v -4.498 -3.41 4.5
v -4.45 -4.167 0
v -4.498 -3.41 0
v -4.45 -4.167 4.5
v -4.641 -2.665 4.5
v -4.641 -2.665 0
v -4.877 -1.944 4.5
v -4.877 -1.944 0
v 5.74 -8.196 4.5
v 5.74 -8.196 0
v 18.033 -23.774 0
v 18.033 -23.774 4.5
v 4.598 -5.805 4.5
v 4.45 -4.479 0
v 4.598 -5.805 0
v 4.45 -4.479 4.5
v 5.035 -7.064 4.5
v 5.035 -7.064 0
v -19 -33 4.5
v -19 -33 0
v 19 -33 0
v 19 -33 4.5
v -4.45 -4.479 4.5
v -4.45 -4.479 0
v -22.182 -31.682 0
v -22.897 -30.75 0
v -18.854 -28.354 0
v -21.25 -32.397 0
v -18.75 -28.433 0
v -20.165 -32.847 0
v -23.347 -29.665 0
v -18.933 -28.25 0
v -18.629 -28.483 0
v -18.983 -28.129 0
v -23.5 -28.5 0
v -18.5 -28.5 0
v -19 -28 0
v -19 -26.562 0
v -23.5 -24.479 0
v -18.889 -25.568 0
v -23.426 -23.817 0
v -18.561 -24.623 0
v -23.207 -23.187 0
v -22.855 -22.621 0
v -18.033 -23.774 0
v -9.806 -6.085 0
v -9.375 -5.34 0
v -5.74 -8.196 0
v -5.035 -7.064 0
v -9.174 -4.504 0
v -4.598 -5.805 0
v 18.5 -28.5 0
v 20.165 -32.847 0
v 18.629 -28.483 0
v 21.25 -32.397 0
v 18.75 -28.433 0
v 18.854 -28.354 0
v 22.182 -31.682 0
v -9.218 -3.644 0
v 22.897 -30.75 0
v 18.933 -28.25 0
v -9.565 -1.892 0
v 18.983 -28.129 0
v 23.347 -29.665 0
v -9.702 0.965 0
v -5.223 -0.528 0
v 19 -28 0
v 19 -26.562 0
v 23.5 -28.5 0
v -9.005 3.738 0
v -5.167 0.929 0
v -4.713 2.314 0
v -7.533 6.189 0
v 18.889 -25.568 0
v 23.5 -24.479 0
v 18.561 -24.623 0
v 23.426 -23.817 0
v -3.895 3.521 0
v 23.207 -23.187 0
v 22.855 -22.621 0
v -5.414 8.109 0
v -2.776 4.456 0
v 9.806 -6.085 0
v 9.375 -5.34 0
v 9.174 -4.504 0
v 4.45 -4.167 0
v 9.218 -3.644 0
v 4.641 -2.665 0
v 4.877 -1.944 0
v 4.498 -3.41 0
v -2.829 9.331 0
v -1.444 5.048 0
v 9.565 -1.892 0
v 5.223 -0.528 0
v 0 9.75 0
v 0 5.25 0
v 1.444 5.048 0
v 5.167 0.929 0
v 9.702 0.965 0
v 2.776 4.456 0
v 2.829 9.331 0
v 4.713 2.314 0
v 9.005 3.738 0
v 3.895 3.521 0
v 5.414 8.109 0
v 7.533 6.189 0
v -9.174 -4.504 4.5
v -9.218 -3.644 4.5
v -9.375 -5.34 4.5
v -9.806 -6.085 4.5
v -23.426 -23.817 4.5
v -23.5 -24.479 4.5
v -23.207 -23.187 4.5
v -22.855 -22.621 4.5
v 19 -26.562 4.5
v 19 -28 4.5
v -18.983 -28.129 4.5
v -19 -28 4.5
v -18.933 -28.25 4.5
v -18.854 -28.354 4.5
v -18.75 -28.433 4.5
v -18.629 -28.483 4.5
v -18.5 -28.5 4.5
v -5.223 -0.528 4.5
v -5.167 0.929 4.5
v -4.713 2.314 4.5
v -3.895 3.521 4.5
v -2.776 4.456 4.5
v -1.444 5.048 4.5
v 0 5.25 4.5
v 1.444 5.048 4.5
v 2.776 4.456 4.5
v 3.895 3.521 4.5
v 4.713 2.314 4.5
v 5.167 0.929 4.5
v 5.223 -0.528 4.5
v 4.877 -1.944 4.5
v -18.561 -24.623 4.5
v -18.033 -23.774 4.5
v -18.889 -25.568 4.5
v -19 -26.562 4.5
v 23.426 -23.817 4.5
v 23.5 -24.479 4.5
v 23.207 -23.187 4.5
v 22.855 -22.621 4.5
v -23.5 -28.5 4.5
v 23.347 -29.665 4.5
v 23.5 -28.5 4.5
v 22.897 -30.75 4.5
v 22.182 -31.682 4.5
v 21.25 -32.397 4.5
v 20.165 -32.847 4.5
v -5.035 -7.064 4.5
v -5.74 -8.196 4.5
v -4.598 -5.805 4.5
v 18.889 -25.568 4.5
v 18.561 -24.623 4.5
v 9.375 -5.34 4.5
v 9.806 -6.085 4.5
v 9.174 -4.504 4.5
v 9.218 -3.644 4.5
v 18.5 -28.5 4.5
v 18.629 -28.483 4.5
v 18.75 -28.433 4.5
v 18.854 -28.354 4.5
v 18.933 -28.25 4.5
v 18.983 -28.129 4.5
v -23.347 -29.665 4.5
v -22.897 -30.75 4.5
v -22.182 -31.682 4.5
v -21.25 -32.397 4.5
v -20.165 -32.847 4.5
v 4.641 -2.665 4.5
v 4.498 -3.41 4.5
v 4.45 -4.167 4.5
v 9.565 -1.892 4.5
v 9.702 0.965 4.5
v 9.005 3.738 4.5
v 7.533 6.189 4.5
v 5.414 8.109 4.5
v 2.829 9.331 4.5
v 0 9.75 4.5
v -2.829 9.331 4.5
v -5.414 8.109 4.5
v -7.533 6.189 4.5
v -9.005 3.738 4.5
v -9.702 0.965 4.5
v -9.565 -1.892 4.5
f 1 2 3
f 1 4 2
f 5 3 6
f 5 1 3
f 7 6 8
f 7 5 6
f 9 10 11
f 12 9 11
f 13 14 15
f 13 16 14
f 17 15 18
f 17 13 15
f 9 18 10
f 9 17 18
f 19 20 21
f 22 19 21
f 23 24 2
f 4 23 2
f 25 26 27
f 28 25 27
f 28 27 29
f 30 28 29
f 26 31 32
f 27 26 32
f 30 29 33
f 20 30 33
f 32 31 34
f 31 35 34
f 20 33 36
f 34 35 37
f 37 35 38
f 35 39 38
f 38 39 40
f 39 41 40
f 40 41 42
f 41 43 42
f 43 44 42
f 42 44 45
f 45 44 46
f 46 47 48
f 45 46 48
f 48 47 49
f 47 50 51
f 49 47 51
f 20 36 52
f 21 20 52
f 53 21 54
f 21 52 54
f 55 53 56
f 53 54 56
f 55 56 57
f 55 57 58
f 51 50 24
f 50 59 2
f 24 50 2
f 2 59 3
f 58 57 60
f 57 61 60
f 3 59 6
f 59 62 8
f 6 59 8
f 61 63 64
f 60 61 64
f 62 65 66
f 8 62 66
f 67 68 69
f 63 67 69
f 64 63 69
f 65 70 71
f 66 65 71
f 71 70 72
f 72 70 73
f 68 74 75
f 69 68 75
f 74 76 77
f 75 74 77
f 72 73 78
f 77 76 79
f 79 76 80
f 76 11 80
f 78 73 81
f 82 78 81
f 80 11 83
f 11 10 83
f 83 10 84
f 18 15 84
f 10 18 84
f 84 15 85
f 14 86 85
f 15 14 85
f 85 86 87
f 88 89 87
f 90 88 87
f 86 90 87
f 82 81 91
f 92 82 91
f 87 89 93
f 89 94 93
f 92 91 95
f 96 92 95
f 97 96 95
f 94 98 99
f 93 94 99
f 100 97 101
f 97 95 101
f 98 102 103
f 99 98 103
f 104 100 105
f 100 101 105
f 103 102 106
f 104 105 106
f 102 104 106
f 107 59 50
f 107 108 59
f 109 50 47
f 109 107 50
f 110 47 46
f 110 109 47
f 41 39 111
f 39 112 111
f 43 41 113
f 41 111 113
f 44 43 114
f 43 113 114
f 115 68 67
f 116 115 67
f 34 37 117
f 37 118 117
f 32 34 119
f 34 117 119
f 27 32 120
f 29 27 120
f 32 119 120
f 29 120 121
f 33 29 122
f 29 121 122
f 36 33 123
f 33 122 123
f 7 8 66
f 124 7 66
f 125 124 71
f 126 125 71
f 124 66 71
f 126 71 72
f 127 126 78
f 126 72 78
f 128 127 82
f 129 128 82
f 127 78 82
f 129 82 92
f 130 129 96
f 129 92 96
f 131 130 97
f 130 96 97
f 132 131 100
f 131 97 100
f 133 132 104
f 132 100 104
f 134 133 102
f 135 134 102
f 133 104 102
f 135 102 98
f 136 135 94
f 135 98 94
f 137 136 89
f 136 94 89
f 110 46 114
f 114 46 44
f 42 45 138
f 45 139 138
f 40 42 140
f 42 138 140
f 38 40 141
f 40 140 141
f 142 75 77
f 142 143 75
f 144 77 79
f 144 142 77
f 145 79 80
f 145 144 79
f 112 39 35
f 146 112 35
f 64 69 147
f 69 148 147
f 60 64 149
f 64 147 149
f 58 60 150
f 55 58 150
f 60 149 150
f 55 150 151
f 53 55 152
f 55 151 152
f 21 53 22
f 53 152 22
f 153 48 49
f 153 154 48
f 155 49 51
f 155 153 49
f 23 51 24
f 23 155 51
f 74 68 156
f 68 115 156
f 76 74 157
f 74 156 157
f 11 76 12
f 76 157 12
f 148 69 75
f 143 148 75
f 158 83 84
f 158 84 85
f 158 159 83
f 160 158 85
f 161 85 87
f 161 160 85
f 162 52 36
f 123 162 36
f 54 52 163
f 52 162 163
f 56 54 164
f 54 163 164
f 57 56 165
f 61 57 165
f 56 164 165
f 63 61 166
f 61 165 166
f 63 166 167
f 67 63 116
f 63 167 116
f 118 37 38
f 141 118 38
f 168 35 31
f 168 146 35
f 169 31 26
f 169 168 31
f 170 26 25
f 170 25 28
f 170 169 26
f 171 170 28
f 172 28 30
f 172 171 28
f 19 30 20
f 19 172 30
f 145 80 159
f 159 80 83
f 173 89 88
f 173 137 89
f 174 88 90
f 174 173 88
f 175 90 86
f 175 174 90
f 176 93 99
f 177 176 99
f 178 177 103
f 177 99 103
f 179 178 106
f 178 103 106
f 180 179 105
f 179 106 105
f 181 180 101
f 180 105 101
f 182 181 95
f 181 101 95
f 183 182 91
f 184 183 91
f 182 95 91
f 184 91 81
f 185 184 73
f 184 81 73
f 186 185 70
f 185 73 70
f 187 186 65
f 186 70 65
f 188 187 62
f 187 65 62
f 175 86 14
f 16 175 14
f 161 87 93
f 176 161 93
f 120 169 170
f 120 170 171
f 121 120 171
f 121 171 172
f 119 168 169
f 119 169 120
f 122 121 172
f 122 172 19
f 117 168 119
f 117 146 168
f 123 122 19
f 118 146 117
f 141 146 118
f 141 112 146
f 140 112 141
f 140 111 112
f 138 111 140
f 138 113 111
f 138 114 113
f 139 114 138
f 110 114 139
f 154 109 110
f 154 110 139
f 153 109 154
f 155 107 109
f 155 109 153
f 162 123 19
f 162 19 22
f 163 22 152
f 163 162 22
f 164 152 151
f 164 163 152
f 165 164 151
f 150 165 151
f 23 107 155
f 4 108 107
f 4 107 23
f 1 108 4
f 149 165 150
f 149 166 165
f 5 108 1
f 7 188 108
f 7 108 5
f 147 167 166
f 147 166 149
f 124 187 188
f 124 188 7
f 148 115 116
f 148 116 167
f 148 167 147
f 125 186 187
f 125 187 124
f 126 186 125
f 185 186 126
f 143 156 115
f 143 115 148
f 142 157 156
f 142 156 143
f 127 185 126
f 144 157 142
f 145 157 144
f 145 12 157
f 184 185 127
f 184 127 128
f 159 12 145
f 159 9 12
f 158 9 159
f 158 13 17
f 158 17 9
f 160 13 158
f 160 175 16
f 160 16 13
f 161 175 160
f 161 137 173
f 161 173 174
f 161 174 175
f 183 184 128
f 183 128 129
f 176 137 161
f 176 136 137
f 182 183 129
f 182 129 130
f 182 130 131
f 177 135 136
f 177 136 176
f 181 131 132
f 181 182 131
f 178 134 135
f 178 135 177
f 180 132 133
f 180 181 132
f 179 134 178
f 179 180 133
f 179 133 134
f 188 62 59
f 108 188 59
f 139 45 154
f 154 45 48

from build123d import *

# Parameters (mm, degrees)
F1_DEPTH = 4.5
F2_R     = 4.5
F3_R     = 3
F4_R     = 0.5
F5_R     = 6


with BuildPart() as f1:
    # F0 (on Top) → F1 (new body)
    with BuildSketch(Plane.XY):
        with BuildLine():
            ThreePointArc((9.564743, -1.89161), (0, 9.75), (-9.564743, -1.89161))
            Line((-9.564743, -1.89161), (-8.95, -5))
            Line((-8.95, -5), (-23.5, -23.438322))
            Line((-23.5, -23.438322), (-23.5, -33))
            Line((-23.5, -33), (23.5, -33))
            Line((23.5, -33), (23.5, -23.438322))
            Line((23.5, -23.438322), (8.95, -5))
            Line((8.95, -5), (9.564743, -1.89161))
        make_face()
        with BuildLine():
            ThreePointArc((-4.45, -2.785678), (0, 5.25), (4.45, -2.785678))
            Line((4.45, -2.785678), (4.45, -6.561678))
            Line((4.45, -6.561678), (19, -25))
            Line((19, -25), (19, -28.5))
            Line((19, -28.5), (-19, -28.5))
            Line((-19, -28.5), (-19, -25))
            Line((-19, -25), (-4.45, -6.561678))
            Line((-4.45, -6.561678), (-4.45, -2.785678))
        make_face(mode=Mode.SUBTRACT)
    extrude(amount=F1_DEPTH)

    # F2
    f2_edges = [f1.edges().sort_by_distance(p)[0] for p in [
        (-19, -25, 2.25),
        (19, -25, 2.25),
        (-23.5, -33, 2.25),
        (23.5, -33, 2.25),
    ]]
    fillet(f2_edges, radius=F2_R)

    # F3
    f3_edges = [f1.edges().sort_by_distance(p)[0] for p in [
        (-8.95, -5, 2.25),
        (8.95, -5, 2.25),
        (23.5, -23.438322, 2.25),
        (-23.5, -23.438322, 2.25),
    ]]
    fillet(f3_edges, radius=F3_R)

    # F4
    f4_edges = [f1.edges().sort_by_distance(p)[0] for p in [
        (-19, -28.5, 2.25),
        (19, -28.5, 2.25),
    ]]
    fillet(f4_edges, radius=F4_R)

    # F5
    f5_edges = [f1.edges().sort_by_distance(p)[0] for p in [
        (4.45, -6.561678, 2.25),
        (-4.45, -6.561678, 2.25),
        (4.45, -2.785678, 2.25),
        (-4.45, -2.785678, 2.25),
    ]]
    fillet(f5_edges, radius=F5_R)


solid = f1.part
